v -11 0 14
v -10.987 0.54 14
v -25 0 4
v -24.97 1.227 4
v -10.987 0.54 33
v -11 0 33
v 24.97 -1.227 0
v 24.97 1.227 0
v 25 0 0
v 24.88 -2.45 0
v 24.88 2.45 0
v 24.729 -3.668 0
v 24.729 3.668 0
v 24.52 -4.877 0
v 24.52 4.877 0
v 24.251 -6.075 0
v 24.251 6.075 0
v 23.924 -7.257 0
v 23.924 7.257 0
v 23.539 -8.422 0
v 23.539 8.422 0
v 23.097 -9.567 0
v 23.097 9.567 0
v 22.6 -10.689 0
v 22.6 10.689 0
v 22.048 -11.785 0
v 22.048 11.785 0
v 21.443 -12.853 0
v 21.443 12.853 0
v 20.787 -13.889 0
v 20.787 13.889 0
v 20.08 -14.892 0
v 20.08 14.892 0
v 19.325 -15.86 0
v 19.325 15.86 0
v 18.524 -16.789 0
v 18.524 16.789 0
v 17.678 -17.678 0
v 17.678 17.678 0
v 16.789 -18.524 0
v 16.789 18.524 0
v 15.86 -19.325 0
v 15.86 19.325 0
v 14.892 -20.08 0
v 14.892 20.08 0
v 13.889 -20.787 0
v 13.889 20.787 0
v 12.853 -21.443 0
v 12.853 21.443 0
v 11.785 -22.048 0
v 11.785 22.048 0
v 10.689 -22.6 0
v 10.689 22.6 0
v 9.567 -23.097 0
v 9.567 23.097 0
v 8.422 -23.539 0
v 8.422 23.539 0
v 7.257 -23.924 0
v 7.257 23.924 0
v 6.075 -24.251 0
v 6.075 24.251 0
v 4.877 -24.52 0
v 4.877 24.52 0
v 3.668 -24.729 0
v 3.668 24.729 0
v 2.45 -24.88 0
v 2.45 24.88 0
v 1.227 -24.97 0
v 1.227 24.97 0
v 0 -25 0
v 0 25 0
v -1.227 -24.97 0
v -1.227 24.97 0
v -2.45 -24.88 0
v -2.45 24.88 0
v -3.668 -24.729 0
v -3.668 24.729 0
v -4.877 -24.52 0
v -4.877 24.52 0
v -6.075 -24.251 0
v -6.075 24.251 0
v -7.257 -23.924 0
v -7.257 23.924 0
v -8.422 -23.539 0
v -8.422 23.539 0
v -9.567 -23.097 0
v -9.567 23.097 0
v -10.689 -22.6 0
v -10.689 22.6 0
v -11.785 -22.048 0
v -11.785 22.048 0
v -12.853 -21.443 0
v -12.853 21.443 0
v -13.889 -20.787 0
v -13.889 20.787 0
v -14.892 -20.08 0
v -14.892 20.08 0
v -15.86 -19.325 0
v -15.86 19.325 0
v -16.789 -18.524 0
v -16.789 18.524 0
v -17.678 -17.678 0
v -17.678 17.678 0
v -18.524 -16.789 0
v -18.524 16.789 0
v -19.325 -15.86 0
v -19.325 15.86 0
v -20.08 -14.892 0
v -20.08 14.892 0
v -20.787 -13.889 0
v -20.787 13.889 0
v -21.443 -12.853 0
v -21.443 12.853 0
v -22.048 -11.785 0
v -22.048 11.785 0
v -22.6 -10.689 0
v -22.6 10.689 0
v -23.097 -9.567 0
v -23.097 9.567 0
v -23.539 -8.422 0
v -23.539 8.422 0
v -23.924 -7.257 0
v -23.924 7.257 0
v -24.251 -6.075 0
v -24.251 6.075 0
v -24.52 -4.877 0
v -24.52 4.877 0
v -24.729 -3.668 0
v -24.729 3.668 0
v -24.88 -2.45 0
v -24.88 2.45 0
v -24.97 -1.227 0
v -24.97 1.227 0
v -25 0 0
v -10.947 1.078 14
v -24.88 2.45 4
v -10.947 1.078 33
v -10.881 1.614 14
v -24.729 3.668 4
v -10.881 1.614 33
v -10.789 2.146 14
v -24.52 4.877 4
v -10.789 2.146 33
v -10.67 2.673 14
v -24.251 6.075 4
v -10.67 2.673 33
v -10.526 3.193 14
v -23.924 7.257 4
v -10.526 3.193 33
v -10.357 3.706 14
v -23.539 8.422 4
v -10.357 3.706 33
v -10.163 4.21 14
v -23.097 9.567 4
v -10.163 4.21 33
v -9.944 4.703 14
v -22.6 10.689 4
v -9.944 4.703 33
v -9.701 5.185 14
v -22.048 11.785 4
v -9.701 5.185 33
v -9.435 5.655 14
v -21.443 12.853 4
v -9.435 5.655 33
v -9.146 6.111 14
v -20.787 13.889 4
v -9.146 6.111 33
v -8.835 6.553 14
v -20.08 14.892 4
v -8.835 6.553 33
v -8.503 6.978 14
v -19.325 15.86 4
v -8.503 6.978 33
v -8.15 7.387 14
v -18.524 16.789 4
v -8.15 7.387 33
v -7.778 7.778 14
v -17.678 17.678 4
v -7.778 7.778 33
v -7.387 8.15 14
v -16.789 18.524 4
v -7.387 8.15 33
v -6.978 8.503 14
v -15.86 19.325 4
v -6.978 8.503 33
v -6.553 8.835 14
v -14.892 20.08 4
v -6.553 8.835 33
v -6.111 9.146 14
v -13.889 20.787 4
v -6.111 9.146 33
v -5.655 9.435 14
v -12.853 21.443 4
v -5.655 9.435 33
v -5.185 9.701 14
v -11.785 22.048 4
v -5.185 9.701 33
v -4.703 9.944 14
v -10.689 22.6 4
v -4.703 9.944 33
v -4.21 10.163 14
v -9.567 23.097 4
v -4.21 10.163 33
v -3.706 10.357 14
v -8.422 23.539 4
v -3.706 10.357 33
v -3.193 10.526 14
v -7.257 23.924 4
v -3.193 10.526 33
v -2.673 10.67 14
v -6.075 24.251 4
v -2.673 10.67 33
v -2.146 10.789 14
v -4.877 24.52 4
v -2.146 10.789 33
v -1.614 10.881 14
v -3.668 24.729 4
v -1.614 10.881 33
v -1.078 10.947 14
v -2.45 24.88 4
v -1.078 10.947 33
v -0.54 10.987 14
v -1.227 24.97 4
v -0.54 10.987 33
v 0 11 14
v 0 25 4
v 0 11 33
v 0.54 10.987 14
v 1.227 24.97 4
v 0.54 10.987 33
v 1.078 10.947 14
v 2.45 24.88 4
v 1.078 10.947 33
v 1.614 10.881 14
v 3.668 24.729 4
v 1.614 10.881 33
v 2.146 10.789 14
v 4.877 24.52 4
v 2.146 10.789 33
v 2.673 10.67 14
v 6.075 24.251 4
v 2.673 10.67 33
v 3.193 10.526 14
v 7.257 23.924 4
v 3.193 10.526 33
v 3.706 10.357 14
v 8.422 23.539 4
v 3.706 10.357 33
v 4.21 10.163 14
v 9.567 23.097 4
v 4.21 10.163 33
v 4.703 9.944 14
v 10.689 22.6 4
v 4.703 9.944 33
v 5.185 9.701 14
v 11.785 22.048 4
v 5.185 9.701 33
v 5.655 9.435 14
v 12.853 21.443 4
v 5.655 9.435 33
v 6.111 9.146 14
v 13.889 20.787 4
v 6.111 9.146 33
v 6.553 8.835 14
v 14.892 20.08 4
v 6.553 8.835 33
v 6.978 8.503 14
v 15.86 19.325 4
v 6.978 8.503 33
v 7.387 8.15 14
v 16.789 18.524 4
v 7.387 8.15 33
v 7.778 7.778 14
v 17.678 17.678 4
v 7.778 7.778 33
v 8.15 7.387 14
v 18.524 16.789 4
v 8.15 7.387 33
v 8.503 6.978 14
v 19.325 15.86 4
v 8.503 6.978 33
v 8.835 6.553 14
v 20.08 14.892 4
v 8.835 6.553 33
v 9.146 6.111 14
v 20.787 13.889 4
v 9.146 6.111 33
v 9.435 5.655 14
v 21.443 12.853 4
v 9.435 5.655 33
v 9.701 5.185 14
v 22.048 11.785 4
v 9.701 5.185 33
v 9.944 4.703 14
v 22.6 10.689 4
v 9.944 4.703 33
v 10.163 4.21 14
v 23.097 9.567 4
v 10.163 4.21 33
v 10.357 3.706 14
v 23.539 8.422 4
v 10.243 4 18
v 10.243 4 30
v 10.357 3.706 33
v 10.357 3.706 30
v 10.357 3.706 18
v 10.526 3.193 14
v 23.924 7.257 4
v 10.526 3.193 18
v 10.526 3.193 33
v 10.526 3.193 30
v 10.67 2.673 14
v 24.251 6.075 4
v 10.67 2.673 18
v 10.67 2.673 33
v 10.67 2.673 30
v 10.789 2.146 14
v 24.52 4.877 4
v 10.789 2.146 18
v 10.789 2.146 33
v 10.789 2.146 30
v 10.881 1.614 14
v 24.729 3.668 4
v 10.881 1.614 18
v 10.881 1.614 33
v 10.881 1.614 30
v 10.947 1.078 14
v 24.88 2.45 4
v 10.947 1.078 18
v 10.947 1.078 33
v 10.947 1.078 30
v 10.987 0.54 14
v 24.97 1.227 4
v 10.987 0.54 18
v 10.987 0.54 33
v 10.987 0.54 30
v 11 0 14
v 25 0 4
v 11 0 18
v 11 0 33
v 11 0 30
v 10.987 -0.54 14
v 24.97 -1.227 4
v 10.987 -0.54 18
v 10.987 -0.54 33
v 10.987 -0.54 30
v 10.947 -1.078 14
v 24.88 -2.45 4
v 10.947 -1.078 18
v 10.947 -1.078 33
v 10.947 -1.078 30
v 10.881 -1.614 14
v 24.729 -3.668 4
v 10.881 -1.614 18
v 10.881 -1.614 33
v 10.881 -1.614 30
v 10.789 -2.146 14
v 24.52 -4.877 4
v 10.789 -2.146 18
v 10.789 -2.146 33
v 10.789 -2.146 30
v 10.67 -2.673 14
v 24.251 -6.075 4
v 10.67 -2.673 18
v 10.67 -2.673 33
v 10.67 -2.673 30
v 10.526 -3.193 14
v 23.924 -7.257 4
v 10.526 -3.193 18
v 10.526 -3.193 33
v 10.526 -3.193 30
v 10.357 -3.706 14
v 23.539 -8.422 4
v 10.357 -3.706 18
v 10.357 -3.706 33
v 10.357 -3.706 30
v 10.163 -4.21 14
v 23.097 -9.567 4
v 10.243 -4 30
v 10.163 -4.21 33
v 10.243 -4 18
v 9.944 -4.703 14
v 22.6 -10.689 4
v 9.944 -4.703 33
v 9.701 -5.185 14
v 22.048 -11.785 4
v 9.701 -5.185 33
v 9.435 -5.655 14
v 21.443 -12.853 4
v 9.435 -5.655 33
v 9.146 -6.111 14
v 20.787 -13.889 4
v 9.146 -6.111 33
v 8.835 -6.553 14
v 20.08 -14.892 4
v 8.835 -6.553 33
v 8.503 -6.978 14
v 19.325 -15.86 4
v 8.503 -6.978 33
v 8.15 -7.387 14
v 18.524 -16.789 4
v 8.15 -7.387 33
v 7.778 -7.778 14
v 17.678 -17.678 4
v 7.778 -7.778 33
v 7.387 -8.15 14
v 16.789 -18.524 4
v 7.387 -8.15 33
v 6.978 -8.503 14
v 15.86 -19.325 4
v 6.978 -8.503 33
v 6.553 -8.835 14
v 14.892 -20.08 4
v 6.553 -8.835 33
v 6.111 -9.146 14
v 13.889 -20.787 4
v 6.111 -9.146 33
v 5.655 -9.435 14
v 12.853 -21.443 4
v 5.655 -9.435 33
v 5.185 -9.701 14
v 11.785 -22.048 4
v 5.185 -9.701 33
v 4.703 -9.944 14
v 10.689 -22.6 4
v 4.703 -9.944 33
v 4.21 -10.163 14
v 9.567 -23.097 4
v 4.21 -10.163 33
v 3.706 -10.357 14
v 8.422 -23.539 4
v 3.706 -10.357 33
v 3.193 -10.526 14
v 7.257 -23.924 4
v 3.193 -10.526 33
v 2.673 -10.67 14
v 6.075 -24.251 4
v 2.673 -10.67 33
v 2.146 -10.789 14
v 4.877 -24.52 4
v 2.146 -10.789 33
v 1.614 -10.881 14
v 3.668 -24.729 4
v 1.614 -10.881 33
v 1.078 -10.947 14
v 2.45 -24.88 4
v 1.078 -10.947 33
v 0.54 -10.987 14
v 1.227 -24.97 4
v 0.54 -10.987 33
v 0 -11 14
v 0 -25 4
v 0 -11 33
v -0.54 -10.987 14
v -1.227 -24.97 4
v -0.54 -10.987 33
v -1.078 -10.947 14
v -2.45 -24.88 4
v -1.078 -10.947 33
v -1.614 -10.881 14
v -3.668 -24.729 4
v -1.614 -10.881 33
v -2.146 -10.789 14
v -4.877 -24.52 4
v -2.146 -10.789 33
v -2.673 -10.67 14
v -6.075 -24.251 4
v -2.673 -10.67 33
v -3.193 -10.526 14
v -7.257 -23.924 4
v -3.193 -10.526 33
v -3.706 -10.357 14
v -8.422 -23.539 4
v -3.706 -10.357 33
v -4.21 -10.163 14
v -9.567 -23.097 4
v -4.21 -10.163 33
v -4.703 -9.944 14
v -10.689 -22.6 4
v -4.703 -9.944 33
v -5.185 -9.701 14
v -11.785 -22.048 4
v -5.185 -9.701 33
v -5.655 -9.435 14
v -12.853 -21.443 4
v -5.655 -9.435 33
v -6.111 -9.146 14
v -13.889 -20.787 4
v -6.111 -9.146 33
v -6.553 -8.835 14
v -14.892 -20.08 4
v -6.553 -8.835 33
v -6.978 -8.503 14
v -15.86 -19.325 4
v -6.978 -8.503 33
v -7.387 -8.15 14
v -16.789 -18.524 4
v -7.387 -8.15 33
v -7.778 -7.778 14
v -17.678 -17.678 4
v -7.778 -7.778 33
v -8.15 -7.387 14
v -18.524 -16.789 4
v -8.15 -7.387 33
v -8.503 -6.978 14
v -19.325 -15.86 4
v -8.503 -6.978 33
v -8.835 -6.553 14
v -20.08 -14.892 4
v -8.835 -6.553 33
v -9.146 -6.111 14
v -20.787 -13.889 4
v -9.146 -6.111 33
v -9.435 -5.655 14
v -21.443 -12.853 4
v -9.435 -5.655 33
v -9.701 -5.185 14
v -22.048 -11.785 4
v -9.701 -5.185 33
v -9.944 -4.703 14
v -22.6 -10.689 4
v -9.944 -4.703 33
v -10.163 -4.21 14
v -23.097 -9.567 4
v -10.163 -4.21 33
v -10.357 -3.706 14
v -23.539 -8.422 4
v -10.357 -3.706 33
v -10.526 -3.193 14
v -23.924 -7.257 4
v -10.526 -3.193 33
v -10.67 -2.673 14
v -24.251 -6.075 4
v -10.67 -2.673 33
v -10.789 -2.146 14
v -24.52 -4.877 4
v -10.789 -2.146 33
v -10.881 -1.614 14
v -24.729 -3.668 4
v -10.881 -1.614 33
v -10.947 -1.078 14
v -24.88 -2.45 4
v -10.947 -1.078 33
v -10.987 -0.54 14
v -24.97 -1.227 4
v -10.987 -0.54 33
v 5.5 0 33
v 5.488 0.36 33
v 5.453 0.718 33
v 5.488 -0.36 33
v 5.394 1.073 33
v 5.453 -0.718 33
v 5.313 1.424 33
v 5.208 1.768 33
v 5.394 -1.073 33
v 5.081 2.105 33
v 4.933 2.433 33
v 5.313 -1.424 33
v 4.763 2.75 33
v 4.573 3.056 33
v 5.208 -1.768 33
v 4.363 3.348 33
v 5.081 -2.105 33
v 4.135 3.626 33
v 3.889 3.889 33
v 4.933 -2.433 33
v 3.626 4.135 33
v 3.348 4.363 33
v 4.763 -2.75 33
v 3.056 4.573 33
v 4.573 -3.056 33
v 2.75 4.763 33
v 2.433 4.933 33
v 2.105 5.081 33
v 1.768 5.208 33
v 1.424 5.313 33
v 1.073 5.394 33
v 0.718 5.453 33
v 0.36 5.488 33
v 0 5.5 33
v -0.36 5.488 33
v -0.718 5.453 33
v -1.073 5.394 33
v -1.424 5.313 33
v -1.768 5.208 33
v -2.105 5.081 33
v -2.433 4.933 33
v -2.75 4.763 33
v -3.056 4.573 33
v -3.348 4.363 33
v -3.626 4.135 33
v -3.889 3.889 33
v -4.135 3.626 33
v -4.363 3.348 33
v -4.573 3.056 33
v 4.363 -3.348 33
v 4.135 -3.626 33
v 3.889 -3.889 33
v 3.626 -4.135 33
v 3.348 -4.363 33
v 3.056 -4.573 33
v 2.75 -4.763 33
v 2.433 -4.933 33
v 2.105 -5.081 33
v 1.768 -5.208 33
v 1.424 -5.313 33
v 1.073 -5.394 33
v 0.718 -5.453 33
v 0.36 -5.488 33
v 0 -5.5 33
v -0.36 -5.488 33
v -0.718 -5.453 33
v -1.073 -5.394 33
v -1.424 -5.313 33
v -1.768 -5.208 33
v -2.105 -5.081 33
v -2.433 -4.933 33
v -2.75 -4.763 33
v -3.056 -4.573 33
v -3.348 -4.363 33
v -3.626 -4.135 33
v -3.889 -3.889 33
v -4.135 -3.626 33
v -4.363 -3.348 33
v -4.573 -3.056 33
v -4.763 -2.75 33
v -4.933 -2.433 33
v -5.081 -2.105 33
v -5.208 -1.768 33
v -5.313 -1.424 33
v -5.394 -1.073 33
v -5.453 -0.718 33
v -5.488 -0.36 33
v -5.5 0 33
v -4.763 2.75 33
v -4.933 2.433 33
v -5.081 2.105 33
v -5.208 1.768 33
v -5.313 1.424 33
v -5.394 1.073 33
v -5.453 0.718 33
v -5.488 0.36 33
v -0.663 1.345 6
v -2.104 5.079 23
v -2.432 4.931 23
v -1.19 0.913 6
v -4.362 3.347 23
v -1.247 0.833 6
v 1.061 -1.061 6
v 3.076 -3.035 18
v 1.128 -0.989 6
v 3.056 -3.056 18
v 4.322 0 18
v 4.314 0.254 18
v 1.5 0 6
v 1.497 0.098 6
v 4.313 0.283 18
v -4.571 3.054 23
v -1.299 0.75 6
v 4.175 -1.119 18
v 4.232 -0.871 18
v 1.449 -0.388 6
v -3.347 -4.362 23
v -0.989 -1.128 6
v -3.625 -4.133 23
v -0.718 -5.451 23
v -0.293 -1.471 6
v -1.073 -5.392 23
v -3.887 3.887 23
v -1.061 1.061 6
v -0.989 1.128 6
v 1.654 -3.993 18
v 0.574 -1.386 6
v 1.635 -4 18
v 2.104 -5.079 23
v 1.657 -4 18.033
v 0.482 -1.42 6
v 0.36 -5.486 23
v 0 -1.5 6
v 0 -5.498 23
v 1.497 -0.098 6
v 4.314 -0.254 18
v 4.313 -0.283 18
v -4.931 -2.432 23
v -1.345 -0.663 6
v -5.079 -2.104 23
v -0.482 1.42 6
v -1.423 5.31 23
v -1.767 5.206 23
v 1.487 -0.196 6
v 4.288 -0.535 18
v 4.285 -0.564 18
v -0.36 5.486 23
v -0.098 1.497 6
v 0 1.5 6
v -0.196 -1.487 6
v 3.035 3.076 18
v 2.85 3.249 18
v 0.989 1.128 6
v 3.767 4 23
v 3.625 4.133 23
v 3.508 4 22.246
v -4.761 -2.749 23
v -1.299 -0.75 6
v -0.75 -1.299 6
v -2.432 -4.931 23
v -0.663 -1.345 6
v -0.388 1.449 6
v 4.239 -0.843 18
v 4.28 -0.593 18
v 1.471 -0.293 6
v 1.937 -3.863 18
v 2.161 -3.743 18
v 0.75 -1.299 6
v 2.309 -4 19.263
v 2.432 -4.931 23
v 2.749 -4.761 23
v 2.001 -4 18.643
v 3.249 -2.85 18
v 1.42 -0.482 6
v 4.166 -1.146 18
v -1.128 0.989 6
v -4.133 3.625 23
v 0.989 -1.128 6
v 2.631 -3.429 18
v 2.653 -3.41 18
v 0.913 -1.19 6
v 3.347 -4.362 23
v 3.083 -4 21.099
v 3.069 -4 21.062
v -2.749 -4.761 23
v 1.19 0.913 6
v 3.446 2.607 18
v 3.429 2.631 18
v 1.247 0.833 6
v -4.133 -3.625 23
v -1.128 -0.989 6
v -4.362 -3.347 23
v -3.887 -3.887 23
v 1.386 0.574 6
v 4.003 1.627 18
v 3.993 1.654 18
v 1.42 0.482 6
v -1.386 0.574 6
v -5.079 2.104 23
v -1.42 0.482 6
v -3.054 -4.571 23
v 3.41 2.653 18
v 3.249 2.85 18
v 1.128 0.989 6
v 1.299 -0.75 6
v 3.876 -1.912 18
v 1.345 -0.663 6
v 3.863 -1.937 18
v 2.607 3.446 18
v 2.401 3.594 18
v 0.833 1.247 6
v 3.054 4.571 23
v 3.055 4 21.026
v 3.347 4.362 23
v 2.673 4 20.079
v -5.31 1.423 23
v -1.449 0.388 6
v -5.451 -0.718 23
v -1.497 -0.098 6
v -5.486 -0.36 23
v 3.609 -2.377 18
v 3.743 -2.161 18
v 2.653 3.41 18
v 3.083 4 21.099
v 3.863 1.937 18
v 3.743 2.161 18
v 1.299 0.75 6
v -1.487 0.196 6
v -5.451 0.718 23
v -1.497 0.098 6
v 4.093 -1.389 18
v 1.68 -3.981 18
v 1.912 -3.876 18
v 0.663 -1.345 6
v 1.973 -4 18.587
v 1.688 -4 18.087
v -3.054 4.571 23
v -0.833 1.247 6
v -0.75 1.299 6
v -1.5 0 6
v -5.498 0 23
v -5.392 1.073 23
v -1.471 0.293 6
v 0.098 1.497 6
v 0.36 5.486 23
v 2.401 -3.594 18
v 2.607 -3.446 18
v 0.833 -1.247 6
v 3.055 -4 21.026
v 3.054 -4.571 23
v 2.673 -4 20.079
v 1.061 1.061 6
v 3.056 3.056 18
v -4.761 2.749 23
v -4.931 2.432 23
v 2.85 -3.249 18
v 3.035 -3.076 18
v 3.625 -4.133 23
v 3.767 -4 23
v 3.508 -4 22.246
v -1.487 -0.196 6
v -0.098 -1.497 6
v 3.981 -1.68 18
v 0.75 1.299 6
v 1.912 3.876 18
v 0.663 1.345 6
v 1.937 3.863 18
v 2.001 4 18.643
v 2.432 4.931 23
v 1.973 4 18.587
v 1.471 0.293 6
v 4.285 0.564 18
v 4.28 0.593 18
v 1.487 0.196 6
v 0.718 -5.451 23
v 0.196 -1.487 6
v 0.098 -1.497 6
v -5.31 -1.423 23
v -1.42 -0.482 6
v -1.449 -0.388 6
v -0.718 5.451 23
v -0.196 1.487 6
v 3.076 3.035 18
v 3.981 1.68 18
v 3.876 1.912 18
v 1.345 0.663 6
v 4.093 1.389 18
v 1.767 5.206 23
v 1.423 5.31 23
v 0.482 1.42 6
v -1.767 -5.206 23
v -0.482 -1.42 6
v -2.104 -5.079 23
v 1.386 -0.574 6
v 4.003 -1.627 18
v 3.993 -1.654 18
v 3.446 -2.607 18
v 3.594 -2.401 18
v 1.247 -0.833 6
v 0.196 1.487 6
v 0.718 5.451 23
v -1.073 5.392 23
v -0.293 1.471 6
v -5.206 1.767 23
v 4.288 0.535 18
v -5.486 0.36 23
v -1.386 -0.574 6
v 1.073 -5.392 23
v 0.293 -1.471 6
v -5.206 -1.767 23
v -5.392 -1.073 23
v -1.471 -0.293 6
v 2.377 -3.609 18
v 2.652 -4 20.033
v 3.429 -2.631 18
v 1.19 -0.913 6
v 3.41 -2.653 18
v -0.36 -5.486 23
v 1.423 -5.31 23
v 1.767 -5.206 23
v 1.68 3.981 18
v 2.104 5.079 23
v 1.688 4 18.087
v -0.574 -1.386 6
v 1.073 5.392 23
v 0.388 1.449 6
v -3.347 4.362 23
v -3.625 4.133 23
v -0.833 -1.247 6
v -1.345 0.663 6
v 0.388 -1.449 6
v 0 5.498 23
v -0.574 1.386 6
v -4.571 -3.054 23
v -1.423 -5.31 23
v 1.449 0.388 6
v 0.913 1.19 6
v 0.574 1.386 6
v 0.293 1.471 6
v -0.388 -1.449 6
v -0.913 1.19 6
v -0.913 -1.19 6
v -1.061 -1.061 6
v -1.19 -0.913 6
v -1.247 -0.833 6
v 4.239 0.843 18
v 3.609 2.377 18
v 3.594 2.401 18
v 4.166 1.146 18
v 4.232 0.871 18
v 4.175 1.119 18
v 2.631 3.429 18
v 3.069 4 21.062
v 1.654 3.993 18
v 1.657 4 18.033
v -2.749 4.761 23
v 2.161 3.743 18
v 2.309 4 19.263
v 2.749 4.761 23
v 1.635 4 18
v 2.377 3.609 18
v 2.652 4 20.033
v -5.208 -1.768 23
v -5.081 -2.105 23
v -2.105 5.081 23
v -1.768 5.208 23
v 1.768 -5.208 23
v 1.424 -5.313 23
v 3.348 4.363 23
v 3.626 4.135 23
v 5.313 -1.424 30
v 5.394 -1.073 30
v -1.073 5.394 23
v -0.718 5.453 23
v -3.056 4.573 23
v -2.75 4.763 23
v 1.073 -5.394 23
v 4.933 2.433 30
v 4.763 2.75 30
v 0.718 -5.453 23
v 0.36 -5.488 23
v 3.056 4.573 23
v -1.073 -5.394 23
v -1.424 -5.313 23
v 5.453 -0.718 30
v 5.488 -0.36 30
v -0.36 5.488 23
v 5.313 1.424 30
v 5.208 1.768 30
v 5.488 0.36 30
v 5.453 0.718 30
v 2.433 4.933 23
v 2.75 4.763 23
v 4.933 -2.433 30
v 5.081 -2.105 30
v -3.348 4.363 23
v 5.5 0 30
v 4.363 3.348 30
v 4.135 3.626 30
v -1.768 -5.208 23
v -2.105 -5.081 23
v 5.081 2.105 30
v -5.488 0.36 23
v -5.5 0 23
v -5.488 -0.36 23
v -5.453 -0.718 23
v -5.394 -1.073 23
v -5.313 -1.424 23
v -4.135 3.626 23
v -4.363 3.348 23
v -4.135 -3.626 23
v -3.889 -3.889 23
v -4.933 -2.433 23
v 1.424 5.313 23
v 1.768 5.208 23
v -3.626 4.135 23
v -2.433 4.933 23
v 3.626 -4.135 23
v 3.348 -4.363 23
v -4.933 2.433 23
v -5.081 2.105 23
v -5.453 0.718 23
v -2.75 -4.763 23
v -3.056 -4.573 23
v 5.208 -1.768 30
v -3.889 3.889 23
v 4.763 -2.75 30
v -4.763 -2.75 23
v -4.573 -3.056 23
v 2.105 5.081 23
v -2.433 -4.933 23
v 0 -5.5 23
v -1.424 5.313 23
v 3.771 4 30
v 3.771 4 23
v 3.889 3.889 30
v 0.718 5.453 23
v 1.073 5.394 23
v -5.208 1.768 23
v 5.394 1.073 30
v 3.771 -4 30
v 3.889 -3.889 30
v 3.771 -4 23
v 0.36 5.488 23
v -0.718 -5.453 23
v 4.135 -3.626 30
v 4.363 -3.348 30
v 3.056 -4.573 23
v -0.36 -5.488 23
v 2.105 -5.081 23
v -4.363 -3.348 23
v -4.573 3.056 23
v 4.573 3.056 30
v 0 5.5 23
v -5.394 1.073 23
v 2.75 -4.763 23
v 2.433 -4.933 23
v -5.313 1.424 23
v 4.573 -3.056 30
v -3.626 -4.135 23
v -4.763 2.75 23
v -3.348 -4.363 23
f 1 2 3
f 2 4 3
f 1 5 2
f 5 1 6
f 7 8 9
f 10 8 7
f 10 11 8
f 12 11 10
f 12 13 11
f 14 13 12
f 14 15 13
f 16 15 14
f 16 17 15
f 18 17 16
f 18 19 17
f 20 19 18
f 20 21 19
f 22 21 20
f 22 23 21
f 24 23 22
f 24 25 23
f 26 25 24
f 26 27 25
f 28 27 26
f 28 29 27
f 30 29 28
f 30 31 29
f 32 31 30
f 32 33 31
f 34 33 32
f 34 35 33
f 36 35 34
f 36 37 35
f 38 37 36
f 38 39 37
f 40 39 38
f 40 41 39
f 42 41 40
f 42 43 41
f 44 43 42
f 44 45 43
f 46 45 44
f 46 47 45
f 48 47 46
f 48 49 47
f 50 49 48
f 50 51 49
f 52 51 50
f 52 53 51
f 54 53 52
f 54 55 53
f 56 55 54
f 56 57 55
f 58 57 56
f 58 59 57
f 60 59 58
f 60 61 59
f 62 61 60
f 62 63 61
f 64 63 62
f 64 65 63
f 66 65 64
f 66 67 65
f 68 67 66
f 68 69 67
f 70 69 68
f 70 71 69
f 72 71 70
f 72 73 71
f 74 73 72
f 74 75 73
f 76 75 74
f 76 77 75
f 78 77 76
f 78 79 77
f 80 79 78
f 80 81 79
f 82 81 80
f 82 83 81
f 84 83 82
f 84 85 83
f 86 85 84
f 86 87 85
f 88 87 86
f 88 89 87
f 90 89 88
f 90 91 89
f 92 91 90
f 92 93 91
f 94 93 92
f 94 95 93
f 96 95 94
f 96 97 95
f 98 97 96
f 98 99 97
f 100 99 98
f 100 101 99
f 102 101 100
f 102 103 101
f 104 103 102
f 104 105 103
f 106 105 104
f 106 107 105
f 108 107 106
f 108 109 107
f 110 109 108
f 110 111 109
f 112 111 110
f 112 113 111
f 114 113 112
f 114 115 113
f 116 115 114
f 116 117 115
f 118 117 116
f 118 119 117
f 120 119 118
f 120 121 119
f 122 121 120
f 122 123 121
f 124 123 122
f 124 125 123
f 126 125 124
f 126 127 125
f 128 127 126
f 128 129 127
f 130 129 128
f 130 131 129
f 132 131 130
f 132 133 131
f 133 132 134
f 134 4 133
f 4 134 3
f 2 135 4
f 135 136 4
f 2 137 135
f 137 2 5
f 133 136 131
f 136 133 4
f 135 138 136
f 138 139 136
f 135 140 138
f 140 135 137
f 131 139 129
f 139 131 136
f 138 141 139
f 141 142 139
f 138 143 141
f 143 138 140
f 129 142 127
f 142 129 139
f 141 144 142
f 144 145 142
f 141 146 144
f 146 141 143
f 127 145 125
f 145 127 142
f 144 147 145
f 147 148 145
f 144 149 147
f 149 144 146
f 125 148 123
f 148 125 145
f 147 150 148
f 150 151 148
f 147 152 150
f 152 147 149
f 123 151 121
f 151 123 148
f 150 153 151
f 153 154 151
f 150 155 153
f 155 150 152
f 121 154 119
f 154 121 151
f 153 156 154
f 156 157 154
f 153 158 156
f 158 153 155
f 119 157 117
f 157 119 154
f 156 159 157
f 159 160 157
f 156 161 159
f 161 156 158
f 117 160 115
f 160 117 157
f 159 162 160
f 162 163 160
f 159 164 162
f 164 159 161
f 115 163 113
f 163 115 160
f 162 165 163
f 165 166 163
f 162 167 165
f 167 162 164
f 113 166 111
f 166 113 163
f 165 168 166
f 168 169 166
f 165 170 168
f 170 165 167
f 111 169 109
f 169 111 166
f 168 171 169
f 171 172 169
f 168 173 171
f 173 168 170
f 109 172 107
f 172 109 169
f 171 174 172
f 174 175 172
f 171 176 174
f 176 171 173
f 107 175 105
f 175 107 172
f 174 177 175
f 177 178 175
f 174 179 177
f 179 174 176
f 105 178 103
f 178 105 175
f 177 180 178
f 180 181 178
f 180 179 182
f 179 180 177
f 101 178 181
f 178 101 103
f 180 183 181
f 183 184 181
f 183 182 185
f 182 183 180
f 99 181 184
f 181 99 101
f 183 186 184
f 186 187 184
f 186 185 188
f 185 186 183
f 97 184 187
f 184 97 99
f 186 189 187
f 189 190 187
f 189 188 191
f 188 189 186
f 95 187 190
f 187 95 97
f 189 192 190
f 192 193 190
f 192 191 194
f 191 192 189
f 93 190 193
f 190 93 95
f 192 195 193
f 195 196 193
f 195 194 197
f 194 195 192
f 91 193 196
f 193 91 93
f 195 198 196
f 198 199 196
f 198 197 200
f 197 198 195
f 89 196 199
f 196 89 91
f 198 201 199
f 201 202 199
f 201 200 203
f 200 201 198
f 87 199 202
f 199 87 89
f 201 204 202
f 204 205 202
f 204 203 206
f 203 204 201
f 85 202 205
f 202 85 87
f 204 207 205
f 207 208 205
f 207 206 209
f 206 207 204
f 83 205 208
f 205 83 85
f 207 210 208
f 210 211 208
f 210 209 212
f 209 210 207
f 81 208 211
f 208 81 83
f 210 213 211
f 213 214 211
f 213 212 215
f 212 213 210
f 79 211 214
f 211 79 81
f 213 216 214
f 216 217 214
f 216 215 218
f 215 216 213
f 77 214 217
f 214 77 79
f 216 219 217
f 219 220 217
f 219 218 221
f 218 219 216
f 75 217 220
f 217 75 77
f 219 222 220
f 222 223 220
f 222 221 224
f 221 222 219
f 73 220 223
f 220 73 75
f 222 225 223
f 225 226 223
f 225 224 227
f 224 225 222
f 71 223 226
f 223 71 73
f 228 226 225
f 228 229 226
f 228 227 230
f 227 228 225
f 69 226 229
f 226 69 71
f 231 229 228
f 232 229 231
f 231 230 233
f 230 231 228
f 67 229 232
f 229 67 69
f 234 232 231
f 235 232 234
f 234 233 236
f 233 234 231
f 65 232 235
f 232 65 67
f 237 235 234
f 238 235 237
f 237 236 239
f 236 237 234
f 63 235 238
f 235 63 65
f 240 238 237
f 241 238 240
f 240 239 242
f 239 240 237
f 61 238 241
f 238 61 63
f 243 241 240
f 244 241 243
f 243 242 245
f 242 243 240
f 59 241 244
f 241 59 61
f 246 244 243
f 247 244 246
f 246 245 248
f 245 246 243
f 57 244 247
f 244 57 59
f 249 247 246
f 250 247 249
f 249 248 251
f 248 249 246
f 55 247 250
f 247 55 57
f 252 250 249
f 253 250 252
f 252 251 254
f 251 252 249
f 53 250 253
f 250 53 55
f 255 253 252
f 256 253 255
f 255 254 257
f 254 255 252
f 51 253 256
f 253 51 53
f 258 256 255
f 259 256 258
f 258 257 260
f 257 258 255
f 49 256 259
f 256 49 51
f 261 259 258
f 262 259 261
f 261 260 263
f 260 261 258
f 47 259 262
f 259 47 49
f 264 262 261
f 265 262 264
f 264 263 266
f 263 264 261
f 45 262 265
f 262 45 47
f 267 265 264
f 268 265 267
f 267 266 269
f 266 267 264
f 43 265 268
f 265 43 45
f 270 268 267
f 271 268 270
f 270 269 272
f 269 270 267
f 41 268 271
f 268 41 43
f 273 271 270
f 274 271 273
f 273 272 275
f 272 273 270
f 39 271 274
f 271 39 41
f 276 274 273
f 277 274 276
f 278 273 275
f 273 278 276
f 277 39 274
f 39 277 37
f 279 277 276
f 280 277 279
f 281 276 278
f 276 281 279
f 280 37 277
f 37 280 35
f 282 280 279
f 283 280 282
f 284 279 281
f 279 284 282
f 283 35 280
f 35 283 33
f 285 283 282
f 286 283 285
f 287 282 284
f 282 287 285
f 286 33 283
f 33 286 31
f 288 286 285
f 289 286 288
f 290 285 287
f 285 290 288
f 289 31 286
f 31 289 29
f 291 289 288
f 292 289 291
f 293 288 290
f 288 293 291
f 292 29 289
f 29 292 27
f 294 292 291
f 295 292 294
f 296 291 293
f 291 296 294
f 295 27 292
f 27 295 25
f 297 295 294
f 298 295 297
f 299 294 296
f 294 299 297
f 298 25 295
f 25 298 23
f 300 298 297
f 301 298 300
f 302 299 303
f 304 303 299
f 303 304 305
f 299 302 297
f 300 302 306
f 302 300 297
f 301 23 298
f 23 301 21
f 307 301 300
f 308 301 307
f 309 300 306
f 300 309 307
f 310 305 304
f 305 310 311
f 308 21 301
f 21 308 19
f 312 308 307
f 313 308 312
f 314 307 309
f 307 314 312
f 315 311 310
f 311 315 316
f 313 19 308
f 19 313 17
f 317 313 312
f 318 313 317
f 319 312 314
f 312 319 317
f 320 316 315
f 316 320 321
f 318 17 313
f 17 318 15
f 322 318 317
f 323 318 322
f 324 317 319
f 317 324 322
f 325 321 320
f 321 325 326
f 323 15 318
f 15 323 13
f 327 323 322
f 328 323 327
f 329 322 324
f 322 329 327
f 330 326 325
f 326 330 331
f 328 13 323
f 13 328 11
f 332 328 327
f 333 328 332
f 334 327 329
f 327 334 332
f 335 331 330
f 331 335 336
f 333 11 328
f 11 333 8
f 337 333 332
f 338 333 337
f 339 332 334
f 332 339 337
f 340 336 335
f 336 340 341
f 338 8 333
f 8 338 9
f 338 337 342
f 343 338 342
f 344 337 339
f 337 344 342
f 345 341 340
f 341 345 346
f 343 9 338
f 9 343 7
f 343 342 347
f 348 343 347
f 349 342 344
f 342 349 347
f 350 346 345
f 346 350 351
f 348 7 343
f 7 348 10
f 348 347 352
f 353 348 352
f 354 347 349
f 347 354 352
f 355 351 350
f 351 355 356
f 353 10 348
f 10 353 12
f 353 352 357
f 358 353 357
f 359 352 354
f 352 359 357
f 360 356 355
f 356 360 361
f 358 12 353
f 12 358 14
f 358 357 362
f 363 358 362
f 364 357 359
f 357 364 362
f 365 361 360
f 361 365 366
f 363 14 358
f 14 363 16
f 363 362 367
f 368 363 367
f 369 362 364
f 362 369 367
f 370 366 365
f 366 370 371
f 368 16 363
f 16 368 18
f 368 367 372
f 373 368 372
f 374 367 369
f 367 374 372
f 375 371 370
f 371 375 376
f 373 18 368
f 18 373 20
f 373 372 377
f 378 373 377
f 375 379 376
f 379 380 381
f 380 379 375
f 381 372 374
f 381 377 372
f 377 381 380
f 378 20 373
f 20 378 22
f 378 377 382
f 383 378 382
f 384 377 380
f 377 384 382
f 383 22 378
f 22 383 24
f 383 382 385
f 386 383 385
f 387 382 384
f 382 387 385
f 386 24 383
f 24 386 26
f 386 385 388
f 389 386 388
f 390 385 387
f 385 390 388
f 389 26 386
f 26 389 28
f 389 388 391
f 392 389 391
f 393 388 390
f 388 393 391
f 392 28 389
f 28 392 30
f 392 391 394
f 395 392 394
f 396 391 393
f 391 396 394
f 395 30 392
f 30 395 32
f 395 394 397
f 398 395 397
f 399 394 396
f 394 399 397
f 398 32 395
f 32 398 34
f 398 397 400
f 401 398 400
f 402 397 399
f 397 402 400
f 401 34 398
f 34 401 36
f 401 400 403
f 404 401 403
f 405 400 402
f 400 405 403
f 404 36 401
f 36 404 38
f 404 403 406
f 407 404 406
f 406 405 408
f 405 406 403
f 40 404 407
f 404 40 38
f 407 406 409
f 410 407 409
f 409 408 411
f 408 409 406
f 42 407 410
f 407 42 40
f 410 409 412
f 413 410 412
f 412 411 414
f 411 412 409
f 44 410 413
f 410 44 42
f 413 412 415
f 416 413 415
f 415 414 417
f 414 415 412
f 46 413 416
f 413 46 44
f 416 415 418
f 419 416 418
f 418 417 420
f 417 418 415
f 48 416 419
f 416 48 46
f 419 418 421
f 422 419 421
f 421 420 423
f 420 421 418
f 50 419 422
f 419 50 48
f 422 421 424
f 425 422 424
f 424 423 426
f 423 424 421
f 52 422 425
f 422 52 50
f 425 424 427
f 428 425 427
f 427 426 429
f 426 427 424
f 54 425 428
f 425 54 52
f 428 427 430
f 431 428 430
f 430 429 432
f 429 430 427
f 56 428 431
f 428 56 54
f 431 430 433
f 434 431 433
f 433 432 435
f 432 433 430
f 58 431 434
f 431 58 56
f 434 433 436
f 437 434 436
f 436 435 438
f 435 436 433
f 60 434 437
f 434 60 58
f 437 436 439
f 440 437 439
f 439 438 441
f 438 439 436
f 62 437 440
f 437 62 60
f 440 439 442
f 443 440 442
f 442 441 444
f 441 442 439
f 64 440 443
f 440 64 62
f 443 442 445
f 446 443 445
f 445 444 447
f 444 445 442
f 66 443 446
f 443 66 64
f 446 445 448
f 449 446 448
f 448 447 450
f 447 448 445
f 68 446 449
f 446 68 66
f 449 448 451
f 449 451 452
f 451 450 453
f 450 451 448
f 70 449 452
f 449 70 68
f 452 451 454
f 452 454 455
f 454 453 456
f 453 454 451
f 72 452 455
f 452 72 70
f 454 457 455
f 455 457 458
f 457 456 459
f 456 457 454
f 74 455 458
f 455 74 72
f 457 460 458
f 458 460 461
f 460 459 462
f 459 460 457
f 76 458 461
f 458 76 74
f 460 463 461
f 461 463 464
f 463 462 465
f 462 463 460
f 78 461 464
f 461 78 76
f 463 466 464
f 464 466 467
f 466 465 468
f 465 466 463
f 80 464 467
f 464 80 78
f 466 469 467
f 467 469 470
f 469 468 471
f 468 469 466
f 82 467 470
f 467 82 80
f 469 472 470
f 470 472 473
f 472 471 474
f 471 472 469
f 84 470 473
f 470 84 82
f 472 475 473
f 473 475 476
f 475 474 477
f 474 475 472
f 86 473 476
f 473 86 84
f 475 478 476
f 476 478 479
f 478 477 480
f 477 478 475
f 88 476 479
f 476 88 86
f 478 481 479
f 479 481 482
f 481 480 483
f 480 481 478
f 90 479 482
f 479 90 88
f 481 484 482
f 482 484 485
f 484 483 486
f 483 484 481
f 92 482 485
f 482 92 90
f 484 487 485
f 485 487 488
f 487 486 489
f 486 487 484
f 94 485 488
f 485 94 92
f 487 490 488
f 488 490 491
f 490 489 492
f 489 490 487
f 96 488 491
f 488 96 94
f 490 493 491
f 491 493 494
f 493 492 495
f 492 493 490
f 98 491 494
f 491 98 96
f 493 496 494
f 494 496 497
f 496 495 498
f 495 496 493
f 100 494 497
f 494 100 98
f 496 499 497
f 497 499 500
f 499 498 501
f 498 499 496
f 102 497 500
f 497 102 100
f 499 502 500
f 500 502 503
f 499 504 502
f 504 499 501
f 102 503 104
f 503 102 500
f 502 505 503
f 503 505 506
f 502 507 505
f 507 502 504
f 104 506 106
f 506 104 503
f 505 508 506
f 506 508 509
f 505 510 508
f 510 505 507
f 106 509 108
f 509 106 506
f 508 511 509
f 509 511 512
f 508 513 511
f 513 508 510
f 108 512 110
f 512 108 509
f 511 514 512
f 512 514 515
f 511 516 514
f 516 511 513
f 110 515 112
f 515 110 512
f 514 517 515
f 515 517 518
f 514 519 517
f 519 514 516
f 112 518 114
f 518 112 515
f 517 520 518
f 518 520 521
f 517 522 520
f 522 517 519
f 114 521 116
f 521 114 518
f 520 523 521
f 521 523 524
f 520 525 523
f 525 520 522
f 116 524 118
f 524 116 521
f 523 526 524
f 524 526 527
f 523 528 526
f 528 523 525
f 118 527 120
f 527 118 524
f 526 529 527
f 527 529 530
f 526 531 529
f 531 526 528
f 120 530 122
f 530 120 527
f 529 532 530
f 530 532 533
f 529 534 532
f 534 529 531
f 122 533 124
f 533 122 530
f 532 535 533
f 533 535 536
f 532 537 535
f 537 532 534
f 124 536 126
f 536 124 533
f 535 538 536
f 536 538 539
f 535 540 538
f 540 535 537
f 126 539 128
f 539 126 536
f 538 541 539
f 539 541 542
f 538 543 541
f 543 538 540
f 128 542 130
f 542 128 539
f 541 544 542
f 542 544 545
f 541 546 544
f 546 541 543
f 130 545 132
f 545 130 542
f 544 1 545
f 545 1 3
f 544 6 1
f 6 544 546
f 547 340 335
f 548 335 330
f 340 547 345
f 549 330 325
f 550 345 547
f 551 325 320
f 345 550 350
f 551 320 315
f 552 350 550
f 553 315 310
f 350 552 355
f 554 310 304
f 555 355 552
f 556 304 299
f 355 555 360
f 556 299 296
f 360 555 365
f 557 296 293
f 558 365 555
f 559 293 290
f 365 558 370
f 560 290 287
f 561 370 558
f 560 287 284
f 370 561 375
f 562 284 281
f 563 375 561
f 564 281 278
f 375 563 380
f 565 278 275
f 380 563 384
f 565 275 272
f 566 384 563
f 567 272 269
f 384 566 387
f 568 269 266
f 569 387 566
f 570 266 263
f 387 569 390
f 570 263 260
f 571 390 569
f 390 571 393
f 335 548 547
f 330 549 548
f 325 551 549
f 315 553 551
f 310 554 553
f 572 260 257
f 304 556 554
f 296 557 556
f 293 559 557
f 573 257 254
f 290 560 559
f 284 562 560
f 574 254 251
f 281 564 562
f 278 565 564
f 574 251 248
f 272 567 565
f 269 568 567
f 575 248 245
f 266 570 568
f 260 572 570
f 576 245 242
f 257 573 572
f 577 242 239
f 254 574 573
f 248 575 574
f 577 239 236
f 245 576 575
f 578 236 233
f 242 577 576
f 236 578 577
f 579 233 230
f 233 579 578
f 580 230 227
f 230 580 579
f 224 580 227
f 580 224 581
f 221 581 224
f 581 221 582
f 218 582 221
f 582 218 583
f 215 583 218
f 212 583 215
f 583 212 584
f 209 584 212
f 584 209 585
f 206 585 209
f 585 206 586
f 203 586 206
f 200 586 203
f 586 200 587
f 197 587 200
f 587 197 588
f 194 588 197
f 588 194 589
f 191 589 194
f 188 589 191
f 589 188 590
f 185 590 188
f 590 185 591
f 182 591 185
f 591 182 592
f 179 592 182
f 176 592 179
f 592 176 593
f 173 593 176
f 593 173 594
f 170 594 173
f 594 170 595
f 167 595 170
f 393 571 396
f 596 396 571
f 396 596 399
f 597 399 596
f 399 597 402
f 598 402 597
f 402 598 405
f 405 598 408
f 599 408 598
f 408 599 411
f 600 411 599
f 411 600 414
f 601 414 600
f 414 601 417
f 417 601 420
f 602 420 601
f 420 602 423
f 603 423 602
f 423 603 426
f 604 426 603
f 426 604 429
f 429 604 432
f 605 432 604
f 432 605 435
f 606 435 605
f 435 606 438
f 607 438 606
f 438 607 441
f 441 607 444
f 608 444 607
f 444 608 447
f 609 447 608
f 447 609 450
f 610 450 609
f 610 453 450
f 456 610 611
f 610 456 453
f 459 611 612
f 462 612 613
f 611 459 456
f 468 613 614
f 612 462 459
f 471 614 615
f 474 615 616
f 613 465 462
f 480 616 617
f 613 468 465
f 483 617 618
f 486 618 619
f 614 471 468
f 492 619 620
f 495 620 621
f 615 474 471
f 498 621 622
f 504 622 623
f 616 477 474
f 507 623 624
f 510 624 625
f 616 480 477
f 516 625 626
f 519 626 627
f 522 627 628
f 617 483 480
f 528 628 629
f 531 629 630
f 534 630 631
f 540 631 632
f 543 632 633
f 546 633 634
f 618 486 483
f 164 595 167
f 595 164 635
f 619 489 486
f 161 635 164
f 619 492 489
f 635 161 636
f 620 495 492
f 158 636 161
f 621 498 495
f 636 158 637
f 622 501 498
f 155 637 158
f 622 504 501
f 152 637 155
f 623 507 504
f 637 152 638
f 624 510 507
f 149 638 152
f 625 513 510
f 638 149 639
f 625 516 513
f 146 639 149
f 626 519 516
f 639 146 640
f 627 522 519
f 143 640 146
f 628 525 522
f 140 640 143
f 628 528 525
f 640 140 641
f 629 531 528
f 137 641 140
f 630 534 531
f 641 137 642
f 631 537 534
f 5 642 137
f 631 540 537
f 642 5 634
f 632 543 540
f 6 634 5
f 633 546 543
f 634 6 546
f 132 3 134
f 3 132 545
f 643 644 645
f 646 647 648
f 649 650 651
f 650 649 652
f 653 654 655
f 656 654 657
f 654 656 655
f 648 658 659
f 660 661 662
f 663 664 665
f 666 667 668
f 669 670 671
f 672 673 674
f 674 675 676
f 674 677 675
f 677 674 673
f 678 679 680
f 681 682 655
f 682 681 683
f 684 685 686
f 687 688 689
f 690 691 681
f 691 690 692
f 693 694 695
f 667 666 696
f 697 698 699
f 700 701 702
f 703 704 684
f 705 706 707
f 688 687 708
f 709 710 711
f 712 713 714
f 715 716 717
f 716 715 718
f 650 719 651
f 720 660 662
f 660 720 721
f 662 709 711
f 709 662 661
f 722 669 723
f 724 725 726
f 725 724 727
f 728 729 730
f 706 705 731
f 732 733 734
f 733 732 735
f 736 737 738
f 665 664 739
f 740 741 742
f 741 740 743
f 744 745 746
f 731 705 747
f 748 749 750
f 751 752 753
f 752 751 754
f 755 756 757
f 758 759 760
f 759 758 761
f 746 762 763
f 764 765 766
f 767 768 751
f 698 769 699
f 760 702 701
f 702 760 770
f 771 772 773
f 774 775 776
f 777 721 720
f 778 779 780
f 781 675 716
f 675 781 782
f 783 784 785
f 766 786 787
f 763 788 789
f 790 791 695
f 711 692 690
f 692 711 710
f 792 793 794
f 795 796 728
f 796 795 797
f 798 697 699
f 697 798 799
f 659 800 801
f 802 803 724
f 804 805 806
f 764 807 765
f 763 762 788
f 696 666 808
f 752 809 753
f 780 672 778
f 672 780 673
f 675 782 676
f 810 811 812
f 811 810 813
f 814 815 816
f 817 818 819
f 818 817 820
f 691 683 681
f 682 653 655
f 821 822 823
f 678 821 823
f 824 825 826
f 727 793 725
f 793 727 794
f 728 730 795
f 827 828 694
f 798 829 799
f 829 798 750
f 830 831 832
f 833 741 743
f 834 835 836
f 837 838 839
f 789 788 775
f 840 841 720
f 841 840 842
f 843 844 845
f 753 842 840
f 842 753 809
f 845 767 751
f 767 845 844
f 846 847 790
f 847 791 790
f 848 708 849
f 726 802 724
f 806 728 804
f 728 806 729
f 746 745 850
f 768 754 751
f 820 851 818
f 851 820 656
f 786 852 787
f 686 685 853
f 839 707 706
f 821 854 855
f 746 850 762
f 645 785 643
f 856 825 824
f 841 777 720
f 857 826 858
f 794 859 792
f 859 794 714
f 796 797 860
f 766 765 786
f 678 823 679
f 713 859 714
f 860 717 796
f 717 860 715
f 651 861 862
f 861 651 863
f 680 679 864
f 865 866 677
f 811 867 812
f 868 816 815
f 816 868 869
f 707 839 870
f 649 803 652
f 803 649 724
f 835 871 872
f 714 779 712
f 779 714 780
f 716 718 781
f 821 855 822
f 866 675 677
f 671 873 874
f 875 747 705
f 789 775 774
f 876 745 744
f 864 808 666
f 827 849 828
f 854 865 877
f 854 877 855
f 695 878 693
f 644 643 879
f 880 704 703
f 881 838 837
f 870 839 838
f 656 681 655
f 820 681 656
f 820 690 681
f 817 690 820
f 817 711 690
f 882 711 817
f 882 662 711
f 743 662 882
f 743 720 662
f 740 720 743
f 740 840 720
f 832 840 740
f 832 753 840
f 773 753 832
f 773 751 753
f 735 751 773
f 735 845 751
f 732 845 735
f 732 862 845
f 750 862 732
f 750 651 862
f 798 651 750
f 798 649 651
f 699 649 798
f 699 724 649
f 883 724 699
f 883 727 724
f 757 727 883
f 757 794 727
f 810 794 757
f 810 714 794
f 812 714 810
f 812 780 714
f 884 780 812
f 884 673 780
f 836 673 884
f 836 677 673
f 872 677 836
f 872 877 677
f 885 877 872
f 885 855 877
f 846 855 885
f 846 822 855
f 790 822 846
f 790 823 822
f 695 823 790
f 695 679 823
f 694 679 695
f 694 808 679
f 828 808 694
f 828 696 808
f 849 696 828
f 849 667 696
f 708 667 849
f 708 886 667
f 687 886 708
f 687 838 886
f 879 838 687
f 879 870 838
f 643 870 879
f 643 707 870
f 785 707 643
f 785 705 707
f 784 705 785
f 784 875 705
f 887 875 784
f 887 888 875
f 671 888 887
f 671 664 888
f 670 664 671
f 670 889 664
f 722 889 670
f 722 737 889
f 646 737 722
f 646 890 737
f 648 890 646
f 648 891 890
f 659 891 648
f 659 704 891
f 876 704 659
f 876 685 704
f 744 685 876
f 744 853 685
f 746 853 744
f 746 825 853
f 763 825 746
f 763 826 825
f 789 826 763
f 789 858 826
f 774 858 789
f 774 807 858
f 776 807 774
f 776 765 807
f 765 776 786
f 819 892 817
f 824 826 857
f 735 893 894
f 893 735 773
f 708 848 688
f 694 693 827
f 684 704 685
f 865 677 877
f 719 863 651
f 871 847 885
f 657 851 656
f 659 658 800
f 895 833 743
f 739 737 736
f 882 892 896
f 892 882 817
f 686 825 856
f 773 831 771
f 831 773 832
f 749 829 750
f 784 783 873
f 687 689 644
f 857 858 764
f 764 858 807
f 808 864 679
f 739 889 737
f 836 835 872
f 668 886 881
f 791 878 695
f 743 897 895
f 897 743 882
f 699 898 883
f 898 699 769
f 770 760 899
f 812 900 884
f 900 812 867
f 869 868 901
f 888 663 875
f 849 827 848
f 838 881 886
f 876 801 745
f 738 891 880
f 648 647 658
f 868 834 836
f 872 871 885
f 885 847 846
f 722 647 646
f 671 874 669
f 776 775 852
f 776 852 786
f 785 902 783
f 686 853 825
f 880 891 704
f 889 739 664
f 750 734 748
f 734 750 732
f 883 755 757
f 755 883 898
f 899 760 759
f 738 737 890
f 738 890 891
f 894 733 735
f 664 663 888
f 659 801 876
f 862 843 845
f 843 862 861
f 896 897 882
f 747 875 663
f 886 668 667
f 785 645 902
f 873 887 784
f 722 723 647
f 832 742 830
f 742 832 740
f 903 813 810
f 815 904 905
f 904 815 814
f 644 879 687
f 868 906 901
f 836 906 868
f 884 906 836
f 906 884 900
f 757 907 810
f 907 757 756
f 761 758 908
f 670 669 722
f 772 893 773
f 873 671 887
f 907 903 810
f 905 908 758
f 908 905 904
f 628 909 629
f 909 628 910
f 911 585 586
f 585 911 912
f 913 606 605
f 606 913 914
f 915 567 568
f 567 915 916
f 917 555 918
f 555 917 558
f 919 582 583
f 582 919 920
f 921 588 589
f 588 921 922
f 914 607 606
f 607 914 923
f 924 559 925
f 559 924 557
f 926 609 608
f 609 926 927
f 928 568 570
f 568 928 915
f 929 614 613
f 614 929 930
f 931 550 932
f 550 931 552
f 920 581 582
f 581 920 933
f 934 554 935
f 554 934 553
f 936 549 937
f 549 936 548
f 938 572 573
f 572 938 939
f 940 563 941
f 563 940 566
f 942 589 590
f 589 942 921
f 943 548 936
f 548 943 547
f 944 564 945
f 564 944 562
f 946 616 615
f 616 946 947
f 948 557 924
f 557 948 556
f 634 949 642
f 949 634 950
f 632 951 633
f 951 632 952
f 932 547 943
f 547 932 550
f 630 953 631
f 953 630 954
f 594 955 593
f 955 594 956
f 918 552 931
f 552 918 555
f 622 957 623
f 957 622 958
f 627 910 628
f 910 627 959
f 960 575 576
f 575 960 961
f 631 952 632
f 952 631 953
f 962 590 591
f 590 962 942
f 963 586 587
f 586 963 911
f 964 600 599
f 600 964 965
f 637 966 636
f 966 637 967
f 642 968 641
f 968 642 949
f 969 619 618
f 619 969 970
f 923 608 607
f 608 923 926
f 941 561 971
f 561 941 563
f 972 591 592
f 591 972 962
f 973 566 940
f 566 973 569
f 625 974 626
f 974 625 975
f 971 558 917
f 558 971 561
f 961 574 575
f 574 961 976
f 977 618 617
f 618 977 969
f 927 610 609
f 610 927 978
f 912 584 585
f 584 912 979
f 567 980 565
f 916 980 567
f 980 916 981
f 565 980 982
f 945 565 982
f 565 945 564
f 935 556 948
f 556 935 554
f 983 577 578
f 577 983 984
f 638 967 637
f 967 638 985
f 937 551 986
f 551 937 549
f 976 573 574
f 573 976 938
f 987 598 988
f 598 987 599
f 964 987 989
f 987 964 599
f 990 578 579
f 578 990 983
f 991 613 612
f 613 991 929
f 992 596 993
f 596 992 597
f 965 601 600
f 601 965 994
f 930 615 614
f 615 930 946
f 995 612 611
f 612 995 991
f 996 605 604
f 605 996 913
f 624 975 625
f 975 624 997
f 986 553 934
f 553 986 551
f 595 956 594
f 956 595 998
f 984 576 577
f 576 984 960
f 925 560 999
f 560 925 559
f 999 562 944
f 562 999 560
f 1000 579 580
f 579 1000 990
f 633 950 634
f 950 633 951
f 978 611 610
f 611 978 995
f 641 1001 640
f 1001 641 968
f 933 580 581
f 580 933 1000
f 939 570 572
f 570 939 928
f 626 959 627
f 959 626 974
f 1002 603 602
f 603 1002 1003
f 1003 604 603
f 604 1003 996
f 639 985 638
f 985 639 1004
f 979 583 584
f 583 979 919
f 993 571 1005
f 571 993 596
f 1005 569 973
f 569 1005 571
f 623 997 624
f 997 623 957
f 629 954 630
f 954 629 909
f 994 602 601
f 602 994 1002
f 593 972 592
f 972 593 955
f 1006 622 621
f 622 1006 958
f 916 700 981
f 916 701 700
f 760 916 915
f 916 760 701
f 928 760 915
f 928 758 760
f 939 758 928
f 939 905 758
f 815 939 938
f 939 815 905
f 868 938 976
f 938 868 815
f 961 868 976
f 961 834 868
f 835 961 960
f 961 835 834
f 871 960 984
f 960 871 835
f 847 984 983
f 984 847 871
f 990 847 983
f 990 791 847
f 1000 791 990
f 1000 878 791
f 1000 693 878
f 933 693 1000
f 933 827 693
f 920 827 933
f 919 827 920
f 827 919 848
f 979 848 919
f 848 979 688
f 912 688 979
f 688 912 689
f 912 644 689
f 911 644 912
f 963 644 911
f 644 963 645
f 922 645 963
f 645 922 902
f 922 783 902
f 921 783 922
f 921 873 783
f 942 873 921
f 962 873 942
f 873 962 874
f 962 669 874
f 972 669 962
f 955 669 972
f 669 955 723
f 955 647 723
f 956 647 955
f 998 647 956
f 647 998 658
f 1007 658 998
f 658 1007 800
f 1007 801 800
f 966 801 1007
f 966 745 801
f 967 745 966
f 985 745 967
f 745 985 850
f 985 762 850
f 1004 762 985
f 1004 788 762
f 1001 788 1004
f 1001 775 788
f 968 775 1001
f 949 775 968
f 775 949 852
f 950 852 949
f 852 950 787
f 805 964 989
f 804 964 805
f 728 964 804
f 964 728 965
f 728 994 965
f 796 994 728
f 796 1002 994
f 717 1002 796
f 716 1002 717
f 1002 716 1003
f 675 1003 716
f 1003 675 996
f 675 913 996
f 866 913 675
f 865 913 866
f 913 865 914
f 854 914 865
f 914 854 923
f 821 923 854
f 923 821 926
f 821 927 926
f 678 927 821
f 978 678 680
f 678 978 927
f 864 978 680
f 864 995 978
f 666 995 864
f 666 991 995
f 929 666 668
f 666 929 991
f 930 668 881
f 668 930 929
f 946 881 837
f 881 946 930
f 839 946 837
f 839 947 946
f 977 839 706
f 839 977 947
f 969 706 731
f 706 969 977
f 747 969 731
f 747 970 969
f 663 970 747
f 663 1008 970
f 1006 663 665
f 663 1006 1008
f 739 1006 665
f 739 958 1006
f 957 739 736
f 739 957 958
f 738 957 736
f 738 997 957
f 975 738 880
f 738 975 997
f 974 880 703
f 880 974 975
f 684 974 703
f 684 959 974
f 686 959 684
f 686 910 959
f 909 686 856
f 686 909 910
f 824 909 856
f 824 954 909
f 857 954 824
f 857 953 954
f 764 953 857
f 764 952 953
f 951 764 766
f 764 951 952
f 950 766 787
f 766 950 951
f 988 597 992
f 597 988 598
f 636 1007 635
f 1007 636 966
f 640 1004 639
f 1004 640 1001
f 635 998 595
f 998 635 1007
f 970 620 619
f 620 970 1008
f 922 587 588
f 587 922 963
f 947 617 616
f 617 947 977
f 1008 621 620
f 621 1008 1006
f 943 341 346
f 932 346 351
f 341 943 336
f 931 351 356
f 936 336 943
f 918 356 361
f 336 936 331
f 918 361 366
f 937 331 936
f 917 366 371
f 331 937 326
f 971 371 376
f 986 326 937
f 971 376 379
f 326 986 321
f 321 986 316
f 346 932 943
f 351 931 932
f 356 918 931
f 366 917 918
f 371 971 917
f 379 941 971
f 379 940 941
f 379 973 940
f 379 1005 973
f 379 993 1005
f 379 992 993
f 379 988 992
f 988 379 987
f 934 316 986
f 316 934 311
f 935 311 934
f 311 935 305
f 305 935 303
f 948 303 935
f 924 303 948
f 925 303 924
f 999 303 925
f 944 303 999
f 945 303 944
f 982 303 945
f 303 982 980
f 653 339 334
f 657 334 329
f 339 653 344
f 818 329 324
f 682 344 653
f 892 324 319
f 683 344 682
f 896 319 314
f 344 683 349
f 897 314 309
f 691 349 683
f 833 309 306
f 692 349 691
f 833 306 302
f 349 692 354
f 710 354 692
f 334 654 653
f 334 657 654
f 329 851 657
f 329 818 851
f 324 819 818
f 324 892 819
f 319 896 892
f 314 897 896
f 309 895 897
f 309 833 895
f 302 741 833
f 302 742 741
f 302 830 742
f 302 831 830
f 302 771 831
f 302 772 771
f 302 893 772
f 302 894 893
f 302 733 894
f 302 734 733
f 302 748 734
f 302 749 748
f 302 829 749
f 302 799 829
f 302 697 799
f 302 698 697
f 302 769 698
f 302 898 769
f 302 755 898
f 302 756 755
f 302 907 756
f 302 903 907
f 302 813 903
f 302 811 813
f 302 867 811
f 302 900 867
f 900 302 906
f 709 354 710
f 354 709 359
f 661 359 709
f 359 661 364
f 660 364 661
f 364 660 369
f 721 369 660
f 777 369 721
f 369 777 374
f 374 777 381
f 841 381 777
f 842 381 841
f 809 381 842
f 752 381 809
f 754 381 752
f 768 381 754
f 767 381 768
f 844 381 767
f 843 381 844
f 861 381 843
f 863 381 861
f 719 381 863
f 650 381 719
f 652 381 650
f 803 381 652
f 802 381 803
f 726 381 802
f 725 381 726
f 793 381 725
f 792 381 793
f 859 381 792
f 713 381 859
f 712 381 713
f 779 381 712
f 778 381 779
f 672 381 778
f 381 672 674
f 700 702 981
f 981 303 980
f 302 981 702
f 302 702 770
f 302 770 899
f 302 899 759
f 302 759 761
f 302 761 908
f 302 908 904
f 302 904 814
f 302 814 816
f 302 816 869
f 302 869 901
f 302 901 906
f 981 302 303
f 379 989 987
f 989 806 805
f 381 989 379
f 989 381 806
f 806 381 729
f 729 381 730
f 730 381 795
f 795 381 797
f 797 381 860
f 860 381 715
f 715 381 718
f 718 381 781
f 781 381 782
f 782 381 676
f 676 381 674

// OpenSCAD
// KNOWN-WRONG PART (must fail): the window is 8 mm wide instead of 4
// Weighing stand that holds one 1.5 mL microcentrifuge tube upright on a balance pan
// Category: quick fixes. A revolved stand (base disc, cone, column) with a seat that follows the
// tube's conical tip, and a viewing window through the column wall on the +X side.
// Print: PLA or PETG, standing up, 0.2 mm layers. Tare the balance with the stand on it.
// SPDX-License-Identifier: CERN-OHL-P-2.0

/* [Stand] */
base_d = 50;  base_h = 4;       // disc z = 0 .. 4
col_d = 22;   cone_top = 14;    // cone 50 -> 22 mm from z = 4 to 14
height = 33;                    // column from z = 14 to 33
seat_d = 11;  seat_cyl_z = 23;  // 11 mm from the top down to z = 23 ...
tip_d = 3;    tip_z = 6;        // ... then a cone narrowing to 3 mm at z = 6
win_w = 8;    win_z = [18, 30]; // viewing window through the +X wall

/* [Hidden] */
$fn = 128;
eps = 0.01;

difference() {
    rotate_extrude() polygon([[0, 0], [base_d / 2, 0], [base_d / 2, base_h], [col_d / 2, cone_top],
                              [col_d / 2, height], [0, height]]);
    translate([0, 0, tip_z]) cylinder(d1 = tip_d, d2 = seat_d, h = seat_cyl_z - tip_z + eps, $fn = 96);
    translate([0, 0, seat_cyl_z]) cylinder(d = seat_d, h = height - seat_cyl_z + 1, $fn = 96);
    translate([0, -win_w / 2, win_z[0]]) cube([col_d / 2 + 1, win_w, win_z[1] - win_z[0]]);
}
